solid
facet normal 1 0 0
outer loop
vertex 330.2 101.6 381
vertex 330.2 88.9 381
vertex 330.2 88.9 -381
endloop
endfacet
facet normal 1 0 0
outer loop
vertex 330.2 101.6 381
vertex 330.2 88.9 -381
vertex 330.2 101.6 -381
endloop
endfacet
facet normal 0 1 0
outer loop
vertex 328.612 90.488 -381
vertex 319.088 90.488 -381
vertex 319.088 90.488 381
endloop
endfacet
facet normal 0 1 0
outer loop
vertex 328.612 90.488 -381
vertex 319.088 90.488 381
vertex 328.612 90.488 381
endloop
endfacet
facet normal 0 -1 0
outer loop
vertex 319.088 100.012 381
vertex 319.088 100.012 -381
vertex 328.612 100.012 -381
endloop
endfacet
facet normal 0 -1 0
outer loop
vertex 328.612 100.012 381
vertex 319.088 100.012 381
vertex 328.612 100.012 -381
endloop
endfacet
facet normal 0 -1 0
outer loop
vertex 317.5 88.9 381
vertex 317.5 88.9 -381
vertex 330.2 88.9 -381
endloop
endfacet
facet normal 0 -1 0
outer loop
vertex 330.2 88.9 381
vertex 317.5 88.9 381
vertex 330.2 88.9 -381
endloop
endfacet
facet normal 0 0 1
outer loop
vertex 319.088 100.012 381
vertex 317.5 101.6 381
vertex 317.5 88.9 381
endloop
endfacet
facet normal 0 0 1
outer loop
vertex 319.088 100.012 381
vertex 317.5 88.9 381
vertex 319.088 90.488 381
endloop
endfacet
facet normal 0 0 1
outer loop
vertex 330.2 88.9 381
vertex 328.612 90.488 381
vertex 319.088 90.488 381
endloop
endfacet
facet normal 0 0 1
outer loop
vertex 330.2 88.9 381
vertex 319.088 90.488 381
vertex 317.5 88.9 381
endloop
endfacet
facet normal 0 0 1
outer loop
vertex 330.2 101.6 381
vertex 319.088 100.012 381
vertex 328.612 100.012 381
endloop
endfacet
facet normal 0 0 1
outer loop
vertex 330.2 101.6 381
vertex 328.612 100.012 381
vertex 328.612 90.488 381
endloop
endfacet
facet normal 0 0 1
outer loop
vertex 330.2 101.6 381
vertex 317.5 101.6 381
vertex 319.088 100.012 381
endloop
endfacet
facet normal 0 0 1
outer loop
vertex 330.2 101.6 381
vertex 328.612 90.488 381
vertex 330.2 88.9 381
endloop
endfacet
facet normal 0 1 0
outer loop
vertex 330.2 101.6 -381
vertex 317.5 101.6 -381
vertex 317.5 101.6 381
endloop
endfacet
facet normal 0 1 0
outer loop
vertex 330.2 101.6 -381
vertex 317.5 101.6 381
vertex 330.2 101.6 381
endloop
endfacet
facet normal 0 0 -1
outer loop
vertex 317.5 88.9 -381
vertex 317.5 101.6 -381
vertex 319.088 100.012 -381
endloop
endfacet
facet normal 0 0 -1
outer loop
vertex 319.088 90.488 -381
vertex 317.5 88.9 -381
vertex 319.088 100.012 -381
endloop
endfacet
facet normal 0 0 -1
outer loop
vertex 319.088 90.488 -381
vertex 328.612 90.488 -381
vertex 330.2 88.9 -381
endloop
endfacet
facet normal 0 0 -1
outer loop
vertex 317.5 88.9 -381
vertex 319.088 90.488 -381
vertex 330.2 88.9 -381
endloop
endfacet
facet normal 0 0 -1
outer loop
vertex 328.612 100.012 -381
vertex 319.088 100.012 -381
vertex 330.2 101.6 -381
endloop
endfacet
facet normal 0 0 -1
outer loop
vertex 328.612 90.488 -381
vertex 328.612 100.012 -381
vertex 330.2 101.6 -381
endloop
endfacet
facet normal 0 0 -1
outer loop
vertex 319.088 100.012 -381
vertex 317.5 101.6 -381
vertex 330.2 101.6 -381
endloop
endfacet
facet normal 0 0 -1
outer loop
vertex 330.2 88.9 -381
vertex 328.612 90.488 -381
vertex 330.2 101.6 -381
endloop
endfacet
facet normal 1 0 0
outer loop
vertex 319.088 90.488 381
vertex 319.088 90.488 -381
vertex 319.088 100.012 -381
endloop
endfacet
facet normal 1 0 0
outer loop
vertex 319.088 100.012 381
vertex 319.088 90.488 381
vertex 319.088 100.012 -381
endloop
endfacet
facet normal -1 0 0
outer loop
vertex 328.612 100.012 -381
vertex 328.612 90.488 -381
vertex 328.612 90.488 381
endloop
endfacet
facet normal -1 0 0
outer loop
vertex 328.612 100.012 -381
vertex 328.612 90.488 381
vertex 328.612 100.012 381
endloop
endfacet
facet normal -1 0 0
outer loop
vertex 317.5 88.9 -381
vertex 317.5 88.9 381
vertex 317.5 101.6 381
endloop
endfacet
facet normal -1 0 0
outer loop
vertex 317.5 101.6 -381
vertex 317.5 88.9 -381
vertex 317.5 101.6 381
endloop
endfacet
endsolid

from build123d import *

# Parameters (mm, degrees)
BOSS_EXTRUDE1_DEPTH      = 381
BOSS_EXTRUDE1_DEPTH_BACK = 381
SKETCH1_W                = 12.7
SKETCH1_H                = 12.7
SKETCH1_W_2              = 9.525
SKETCH1_H_2              = 9.525


with BuildPart() as part:
    # Sketch1 → Boss-Extrude1 (new, two sides: drawn at the far end of the back side and taken through both)
    with BuildSketch(Plane.XY.offset(-BOSS_EXTRUDE1_DEPTH_BACK)):
        with Locations((323.85, 95.25)):
            Rectangle(SKETCH1_W, SKETCH1_H)
        with Locations((323.85, 95.25)):
            Rectangle(SKETCH1_W_2, SKETCH1_H_2, mode=Mode.SUBTRACT)
    extrude(amount=BOSS_EXTRUDE1_DEPTH + BOSS_EXTRUDE1_DEPTH_BACK)


solid = part.part
